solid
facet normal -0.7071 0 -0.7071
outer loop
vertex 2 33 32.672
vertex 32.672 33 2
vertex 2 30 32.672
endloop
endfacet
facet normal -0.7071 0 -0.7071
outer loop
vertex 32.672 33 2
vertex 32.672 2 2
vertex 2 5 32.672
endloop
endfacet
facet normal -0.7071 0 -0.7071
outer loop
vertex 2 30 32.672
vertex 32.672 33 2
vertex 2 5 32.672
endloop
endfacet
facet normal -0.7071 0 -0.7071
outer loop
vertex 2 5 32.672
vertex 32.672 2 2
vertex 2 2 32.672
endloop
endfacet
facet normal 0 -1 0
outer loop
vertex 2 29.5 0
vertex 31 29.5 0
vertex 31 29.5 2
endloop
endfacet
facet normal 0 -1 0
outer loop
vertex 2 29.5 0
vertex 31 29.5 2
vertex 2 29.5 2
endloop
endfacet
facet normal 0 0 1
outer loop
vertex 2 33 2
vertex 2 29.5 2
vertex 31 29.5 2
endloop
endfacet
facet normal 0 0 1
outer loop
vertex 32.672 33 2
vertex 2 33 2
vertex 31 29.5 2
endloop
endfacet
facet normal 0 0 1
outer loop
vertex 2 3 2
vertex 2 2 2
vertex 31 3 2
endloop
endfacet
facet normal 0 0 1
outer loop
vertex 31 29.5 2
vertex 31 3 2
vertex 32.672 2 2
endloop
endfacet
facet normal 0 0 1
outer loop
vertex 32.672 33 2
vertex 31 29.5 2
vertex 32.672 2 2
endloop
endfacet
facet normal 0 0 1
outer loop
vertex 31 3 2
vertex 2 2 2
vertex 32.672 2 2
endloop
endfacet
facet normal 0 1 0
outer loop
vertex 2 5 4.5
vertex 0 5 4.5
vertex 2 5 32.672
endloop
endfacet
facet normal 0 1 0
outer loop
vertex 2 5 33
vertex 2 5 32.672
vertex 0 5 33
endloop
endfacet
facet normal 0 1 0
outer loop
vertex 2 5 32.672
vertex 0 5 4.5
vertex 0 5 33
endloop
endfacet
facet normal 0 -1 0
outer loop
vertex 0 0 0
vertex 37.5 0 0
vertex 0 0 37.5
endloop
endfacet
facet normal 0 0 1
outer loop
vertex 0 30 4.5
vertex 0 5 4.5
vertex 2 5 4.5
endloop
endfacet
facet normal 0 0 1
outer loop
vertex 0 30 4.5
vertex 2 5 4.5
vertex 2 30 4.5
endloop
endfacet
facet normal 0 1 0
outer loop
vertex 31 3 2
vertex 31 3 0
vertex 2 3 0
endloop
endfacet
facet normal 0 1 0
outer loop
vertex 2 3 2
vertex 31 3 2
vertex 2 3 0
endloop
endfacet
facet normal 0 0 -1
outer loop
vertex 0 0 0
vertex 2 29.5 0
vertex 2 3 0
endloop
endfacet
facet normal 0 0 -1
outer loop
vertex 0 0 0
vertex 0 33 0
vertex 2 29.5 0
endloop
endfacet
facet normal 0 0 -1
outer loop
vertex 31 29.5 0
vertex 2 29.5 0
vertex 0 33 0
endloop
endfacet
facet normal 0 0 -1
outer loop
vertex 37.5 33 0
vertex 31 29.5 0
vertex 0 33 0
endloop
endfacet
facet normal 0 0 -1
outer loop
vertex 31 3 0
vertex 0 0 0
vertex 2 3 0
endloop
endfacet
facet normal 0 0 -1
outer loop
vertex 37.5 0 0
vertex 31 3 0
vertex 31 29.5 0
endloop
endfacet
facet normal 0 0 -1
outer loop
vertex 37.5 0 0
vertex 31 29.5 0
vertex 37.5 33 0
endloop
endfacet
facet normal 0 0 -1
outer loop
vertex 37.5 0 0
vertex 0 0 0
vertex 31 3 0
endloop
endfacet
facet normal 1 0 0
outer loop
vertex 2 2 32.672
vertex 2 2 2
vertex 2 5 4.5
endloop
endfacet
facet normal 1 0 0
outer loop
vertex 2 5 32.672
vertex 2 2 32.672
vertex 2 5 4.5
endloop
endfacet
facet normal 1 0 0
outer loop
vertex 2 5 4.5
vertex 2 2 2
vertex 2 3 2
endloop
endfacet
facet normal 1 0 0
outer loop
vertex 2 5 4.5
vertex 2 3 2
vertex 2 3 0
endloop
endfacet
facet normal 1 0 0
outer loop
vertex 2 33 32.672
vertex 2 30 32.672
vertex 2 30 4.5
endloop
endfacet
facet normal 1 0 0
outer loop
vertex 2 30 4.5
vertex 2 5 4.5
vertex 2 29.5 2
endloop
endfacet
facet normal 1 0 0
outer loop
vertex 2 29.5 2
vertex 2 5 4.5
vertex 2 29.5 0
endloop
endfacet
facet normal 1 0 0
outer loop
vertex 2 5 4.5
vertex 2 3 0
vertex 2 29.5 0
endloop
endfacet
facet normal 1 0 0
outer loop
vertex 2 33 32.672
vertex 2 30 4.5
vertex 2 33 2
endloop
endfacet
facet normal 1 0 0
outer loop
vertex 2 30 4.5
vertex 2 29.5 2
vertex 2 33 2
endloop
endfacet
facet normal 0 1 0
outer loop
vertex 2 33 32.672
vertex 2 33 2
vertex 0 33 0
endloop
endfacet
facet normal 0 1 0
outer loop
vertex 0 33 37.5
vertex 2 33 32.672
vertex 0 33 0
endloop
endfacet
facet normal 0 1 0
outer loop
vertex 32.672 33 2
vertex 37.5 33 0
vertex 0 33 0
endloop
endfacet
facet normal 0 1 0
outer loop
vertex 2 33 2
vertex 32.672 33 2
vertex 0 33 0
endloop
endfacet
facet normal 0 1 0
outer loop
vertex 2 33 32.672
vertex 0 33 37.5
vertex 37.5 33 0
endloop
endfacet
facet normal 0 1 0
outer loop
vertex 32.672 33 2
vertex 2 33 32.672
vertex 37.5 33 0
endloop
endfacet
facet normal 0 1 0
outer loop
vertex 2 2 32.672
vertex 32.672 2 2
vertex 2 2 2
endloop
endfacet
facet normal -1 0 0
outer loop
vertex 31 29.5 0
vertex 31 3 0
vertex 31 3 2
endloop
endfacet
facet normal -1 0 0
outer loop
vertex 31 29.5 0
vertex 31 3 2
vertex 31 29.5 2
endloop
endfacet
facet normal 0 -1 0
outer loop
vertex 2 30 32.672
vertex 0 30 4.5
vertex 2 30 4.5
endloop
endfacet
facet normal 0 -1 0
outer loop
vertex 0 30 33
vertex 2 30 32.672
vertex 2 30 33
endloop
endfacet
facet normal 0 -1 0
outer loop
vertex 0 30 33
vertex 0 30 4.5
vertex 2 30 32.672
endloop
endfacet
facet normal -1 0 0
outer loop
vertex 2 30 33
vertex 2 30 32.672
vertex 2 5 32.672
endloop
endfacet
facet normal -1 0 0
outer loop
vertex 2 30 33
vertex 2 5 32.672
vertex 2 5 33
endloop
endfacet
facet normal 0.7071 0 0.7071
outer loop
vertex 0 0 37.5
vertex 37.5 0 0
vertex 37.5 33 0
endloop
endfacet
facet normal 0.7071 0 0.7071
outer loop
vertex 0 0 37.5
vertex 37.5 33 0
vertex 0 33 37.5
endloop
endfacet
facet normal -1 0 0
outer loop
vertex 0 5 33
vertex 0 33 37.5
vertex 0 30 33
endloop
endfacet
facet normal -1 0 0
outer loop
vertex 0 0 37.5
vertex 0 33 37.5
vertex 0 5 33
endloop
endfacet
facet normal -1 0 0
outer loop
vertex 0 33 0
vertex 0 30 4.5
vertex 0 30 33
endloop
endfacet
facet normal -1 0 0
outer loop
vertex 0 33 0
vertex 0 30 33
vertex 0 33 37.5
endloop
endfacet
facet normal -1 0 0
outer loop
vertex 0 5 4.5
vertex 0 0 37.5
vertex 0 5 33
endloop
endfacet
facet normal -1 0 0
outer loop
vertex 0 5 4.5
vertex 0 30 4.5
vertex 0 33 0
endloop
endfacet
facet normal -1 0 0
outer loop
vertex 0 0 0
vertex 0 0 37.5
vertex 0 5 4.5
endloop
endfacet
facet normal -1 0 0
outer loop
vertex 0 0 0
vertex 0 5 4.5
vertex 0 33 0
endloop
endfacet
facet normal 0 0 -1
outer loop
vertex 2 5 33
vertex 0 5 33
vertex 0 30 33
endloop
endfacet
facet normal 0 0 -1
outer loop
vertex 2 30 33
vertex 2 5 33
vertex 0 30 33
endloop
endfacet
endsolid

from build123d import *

# Parameters (mm, degrees)
BOSS_EXTRUDE1_DEPTH = 33
BOSS_EXTRUDE2_DEPTH = 2
SKETCH3_W           = 29
SKETCH3_H           = 26.5
CUT_EXTRUDE1_DEPTH  = 2
SKETCH4_W           = 28.5
SKETCH4_H           = 25
CUT_EXTRUDE2_DEPTH  = 2


with BuildPart() as part:
    # Sketch1 → Boss-Extrude1 (new body)
    with BuildSketch(Plane(origin=(0, 0, 0), x_dir=(1, 0, 0), z_dir=(0, 1, 0))):
        Polygon((0, 0), (37.5, 0), (0, -37.5), align=None)
        Polygon((2, -2), (32.671572875, -2), (2, -32.671572875), align=None, mode=Mode.SUBTRACT)
    extrude(amount=BOSS_EXTRUDE1_DEPTH)

    # Sketch2 → Boss-Extrude2 (add)
    with BuildSketch(Plane.XZ):
        Polygon((2, 32.671572875), (32.671572875, 2), (2, 2), align=None)
    extrude(amount=-BOSS_EXTRUDE2_DEPTH)

    # Sketch3 → Cut-Extrude1 (cut)
    with BuildSketch(Plane(origin=(0, 0, 0), x_dir=(-1, 0, 0), z_dir=(0, 0, -1))):
        with Locations((-16.5, 16.25)):
            Rectangle(SKETCH3_W, SKETCH3_H)
    extrude(amount=-CUT_EXTRUDE1_DEPTH, mode=Mode.SUBTRACT)

    # Sketch4 → Cut-Extrude2 (cut)
    with BuildSketch(Plane.ZY):
        with Locations((18.75, 17.5)):
            Rectangle(SKETCH4_W, SKETCH4_H)
    extrude(amount=-CUT_EXTRUDE2_DEPTH, mode=Mode.SUBTRACT)


solid = part.part
